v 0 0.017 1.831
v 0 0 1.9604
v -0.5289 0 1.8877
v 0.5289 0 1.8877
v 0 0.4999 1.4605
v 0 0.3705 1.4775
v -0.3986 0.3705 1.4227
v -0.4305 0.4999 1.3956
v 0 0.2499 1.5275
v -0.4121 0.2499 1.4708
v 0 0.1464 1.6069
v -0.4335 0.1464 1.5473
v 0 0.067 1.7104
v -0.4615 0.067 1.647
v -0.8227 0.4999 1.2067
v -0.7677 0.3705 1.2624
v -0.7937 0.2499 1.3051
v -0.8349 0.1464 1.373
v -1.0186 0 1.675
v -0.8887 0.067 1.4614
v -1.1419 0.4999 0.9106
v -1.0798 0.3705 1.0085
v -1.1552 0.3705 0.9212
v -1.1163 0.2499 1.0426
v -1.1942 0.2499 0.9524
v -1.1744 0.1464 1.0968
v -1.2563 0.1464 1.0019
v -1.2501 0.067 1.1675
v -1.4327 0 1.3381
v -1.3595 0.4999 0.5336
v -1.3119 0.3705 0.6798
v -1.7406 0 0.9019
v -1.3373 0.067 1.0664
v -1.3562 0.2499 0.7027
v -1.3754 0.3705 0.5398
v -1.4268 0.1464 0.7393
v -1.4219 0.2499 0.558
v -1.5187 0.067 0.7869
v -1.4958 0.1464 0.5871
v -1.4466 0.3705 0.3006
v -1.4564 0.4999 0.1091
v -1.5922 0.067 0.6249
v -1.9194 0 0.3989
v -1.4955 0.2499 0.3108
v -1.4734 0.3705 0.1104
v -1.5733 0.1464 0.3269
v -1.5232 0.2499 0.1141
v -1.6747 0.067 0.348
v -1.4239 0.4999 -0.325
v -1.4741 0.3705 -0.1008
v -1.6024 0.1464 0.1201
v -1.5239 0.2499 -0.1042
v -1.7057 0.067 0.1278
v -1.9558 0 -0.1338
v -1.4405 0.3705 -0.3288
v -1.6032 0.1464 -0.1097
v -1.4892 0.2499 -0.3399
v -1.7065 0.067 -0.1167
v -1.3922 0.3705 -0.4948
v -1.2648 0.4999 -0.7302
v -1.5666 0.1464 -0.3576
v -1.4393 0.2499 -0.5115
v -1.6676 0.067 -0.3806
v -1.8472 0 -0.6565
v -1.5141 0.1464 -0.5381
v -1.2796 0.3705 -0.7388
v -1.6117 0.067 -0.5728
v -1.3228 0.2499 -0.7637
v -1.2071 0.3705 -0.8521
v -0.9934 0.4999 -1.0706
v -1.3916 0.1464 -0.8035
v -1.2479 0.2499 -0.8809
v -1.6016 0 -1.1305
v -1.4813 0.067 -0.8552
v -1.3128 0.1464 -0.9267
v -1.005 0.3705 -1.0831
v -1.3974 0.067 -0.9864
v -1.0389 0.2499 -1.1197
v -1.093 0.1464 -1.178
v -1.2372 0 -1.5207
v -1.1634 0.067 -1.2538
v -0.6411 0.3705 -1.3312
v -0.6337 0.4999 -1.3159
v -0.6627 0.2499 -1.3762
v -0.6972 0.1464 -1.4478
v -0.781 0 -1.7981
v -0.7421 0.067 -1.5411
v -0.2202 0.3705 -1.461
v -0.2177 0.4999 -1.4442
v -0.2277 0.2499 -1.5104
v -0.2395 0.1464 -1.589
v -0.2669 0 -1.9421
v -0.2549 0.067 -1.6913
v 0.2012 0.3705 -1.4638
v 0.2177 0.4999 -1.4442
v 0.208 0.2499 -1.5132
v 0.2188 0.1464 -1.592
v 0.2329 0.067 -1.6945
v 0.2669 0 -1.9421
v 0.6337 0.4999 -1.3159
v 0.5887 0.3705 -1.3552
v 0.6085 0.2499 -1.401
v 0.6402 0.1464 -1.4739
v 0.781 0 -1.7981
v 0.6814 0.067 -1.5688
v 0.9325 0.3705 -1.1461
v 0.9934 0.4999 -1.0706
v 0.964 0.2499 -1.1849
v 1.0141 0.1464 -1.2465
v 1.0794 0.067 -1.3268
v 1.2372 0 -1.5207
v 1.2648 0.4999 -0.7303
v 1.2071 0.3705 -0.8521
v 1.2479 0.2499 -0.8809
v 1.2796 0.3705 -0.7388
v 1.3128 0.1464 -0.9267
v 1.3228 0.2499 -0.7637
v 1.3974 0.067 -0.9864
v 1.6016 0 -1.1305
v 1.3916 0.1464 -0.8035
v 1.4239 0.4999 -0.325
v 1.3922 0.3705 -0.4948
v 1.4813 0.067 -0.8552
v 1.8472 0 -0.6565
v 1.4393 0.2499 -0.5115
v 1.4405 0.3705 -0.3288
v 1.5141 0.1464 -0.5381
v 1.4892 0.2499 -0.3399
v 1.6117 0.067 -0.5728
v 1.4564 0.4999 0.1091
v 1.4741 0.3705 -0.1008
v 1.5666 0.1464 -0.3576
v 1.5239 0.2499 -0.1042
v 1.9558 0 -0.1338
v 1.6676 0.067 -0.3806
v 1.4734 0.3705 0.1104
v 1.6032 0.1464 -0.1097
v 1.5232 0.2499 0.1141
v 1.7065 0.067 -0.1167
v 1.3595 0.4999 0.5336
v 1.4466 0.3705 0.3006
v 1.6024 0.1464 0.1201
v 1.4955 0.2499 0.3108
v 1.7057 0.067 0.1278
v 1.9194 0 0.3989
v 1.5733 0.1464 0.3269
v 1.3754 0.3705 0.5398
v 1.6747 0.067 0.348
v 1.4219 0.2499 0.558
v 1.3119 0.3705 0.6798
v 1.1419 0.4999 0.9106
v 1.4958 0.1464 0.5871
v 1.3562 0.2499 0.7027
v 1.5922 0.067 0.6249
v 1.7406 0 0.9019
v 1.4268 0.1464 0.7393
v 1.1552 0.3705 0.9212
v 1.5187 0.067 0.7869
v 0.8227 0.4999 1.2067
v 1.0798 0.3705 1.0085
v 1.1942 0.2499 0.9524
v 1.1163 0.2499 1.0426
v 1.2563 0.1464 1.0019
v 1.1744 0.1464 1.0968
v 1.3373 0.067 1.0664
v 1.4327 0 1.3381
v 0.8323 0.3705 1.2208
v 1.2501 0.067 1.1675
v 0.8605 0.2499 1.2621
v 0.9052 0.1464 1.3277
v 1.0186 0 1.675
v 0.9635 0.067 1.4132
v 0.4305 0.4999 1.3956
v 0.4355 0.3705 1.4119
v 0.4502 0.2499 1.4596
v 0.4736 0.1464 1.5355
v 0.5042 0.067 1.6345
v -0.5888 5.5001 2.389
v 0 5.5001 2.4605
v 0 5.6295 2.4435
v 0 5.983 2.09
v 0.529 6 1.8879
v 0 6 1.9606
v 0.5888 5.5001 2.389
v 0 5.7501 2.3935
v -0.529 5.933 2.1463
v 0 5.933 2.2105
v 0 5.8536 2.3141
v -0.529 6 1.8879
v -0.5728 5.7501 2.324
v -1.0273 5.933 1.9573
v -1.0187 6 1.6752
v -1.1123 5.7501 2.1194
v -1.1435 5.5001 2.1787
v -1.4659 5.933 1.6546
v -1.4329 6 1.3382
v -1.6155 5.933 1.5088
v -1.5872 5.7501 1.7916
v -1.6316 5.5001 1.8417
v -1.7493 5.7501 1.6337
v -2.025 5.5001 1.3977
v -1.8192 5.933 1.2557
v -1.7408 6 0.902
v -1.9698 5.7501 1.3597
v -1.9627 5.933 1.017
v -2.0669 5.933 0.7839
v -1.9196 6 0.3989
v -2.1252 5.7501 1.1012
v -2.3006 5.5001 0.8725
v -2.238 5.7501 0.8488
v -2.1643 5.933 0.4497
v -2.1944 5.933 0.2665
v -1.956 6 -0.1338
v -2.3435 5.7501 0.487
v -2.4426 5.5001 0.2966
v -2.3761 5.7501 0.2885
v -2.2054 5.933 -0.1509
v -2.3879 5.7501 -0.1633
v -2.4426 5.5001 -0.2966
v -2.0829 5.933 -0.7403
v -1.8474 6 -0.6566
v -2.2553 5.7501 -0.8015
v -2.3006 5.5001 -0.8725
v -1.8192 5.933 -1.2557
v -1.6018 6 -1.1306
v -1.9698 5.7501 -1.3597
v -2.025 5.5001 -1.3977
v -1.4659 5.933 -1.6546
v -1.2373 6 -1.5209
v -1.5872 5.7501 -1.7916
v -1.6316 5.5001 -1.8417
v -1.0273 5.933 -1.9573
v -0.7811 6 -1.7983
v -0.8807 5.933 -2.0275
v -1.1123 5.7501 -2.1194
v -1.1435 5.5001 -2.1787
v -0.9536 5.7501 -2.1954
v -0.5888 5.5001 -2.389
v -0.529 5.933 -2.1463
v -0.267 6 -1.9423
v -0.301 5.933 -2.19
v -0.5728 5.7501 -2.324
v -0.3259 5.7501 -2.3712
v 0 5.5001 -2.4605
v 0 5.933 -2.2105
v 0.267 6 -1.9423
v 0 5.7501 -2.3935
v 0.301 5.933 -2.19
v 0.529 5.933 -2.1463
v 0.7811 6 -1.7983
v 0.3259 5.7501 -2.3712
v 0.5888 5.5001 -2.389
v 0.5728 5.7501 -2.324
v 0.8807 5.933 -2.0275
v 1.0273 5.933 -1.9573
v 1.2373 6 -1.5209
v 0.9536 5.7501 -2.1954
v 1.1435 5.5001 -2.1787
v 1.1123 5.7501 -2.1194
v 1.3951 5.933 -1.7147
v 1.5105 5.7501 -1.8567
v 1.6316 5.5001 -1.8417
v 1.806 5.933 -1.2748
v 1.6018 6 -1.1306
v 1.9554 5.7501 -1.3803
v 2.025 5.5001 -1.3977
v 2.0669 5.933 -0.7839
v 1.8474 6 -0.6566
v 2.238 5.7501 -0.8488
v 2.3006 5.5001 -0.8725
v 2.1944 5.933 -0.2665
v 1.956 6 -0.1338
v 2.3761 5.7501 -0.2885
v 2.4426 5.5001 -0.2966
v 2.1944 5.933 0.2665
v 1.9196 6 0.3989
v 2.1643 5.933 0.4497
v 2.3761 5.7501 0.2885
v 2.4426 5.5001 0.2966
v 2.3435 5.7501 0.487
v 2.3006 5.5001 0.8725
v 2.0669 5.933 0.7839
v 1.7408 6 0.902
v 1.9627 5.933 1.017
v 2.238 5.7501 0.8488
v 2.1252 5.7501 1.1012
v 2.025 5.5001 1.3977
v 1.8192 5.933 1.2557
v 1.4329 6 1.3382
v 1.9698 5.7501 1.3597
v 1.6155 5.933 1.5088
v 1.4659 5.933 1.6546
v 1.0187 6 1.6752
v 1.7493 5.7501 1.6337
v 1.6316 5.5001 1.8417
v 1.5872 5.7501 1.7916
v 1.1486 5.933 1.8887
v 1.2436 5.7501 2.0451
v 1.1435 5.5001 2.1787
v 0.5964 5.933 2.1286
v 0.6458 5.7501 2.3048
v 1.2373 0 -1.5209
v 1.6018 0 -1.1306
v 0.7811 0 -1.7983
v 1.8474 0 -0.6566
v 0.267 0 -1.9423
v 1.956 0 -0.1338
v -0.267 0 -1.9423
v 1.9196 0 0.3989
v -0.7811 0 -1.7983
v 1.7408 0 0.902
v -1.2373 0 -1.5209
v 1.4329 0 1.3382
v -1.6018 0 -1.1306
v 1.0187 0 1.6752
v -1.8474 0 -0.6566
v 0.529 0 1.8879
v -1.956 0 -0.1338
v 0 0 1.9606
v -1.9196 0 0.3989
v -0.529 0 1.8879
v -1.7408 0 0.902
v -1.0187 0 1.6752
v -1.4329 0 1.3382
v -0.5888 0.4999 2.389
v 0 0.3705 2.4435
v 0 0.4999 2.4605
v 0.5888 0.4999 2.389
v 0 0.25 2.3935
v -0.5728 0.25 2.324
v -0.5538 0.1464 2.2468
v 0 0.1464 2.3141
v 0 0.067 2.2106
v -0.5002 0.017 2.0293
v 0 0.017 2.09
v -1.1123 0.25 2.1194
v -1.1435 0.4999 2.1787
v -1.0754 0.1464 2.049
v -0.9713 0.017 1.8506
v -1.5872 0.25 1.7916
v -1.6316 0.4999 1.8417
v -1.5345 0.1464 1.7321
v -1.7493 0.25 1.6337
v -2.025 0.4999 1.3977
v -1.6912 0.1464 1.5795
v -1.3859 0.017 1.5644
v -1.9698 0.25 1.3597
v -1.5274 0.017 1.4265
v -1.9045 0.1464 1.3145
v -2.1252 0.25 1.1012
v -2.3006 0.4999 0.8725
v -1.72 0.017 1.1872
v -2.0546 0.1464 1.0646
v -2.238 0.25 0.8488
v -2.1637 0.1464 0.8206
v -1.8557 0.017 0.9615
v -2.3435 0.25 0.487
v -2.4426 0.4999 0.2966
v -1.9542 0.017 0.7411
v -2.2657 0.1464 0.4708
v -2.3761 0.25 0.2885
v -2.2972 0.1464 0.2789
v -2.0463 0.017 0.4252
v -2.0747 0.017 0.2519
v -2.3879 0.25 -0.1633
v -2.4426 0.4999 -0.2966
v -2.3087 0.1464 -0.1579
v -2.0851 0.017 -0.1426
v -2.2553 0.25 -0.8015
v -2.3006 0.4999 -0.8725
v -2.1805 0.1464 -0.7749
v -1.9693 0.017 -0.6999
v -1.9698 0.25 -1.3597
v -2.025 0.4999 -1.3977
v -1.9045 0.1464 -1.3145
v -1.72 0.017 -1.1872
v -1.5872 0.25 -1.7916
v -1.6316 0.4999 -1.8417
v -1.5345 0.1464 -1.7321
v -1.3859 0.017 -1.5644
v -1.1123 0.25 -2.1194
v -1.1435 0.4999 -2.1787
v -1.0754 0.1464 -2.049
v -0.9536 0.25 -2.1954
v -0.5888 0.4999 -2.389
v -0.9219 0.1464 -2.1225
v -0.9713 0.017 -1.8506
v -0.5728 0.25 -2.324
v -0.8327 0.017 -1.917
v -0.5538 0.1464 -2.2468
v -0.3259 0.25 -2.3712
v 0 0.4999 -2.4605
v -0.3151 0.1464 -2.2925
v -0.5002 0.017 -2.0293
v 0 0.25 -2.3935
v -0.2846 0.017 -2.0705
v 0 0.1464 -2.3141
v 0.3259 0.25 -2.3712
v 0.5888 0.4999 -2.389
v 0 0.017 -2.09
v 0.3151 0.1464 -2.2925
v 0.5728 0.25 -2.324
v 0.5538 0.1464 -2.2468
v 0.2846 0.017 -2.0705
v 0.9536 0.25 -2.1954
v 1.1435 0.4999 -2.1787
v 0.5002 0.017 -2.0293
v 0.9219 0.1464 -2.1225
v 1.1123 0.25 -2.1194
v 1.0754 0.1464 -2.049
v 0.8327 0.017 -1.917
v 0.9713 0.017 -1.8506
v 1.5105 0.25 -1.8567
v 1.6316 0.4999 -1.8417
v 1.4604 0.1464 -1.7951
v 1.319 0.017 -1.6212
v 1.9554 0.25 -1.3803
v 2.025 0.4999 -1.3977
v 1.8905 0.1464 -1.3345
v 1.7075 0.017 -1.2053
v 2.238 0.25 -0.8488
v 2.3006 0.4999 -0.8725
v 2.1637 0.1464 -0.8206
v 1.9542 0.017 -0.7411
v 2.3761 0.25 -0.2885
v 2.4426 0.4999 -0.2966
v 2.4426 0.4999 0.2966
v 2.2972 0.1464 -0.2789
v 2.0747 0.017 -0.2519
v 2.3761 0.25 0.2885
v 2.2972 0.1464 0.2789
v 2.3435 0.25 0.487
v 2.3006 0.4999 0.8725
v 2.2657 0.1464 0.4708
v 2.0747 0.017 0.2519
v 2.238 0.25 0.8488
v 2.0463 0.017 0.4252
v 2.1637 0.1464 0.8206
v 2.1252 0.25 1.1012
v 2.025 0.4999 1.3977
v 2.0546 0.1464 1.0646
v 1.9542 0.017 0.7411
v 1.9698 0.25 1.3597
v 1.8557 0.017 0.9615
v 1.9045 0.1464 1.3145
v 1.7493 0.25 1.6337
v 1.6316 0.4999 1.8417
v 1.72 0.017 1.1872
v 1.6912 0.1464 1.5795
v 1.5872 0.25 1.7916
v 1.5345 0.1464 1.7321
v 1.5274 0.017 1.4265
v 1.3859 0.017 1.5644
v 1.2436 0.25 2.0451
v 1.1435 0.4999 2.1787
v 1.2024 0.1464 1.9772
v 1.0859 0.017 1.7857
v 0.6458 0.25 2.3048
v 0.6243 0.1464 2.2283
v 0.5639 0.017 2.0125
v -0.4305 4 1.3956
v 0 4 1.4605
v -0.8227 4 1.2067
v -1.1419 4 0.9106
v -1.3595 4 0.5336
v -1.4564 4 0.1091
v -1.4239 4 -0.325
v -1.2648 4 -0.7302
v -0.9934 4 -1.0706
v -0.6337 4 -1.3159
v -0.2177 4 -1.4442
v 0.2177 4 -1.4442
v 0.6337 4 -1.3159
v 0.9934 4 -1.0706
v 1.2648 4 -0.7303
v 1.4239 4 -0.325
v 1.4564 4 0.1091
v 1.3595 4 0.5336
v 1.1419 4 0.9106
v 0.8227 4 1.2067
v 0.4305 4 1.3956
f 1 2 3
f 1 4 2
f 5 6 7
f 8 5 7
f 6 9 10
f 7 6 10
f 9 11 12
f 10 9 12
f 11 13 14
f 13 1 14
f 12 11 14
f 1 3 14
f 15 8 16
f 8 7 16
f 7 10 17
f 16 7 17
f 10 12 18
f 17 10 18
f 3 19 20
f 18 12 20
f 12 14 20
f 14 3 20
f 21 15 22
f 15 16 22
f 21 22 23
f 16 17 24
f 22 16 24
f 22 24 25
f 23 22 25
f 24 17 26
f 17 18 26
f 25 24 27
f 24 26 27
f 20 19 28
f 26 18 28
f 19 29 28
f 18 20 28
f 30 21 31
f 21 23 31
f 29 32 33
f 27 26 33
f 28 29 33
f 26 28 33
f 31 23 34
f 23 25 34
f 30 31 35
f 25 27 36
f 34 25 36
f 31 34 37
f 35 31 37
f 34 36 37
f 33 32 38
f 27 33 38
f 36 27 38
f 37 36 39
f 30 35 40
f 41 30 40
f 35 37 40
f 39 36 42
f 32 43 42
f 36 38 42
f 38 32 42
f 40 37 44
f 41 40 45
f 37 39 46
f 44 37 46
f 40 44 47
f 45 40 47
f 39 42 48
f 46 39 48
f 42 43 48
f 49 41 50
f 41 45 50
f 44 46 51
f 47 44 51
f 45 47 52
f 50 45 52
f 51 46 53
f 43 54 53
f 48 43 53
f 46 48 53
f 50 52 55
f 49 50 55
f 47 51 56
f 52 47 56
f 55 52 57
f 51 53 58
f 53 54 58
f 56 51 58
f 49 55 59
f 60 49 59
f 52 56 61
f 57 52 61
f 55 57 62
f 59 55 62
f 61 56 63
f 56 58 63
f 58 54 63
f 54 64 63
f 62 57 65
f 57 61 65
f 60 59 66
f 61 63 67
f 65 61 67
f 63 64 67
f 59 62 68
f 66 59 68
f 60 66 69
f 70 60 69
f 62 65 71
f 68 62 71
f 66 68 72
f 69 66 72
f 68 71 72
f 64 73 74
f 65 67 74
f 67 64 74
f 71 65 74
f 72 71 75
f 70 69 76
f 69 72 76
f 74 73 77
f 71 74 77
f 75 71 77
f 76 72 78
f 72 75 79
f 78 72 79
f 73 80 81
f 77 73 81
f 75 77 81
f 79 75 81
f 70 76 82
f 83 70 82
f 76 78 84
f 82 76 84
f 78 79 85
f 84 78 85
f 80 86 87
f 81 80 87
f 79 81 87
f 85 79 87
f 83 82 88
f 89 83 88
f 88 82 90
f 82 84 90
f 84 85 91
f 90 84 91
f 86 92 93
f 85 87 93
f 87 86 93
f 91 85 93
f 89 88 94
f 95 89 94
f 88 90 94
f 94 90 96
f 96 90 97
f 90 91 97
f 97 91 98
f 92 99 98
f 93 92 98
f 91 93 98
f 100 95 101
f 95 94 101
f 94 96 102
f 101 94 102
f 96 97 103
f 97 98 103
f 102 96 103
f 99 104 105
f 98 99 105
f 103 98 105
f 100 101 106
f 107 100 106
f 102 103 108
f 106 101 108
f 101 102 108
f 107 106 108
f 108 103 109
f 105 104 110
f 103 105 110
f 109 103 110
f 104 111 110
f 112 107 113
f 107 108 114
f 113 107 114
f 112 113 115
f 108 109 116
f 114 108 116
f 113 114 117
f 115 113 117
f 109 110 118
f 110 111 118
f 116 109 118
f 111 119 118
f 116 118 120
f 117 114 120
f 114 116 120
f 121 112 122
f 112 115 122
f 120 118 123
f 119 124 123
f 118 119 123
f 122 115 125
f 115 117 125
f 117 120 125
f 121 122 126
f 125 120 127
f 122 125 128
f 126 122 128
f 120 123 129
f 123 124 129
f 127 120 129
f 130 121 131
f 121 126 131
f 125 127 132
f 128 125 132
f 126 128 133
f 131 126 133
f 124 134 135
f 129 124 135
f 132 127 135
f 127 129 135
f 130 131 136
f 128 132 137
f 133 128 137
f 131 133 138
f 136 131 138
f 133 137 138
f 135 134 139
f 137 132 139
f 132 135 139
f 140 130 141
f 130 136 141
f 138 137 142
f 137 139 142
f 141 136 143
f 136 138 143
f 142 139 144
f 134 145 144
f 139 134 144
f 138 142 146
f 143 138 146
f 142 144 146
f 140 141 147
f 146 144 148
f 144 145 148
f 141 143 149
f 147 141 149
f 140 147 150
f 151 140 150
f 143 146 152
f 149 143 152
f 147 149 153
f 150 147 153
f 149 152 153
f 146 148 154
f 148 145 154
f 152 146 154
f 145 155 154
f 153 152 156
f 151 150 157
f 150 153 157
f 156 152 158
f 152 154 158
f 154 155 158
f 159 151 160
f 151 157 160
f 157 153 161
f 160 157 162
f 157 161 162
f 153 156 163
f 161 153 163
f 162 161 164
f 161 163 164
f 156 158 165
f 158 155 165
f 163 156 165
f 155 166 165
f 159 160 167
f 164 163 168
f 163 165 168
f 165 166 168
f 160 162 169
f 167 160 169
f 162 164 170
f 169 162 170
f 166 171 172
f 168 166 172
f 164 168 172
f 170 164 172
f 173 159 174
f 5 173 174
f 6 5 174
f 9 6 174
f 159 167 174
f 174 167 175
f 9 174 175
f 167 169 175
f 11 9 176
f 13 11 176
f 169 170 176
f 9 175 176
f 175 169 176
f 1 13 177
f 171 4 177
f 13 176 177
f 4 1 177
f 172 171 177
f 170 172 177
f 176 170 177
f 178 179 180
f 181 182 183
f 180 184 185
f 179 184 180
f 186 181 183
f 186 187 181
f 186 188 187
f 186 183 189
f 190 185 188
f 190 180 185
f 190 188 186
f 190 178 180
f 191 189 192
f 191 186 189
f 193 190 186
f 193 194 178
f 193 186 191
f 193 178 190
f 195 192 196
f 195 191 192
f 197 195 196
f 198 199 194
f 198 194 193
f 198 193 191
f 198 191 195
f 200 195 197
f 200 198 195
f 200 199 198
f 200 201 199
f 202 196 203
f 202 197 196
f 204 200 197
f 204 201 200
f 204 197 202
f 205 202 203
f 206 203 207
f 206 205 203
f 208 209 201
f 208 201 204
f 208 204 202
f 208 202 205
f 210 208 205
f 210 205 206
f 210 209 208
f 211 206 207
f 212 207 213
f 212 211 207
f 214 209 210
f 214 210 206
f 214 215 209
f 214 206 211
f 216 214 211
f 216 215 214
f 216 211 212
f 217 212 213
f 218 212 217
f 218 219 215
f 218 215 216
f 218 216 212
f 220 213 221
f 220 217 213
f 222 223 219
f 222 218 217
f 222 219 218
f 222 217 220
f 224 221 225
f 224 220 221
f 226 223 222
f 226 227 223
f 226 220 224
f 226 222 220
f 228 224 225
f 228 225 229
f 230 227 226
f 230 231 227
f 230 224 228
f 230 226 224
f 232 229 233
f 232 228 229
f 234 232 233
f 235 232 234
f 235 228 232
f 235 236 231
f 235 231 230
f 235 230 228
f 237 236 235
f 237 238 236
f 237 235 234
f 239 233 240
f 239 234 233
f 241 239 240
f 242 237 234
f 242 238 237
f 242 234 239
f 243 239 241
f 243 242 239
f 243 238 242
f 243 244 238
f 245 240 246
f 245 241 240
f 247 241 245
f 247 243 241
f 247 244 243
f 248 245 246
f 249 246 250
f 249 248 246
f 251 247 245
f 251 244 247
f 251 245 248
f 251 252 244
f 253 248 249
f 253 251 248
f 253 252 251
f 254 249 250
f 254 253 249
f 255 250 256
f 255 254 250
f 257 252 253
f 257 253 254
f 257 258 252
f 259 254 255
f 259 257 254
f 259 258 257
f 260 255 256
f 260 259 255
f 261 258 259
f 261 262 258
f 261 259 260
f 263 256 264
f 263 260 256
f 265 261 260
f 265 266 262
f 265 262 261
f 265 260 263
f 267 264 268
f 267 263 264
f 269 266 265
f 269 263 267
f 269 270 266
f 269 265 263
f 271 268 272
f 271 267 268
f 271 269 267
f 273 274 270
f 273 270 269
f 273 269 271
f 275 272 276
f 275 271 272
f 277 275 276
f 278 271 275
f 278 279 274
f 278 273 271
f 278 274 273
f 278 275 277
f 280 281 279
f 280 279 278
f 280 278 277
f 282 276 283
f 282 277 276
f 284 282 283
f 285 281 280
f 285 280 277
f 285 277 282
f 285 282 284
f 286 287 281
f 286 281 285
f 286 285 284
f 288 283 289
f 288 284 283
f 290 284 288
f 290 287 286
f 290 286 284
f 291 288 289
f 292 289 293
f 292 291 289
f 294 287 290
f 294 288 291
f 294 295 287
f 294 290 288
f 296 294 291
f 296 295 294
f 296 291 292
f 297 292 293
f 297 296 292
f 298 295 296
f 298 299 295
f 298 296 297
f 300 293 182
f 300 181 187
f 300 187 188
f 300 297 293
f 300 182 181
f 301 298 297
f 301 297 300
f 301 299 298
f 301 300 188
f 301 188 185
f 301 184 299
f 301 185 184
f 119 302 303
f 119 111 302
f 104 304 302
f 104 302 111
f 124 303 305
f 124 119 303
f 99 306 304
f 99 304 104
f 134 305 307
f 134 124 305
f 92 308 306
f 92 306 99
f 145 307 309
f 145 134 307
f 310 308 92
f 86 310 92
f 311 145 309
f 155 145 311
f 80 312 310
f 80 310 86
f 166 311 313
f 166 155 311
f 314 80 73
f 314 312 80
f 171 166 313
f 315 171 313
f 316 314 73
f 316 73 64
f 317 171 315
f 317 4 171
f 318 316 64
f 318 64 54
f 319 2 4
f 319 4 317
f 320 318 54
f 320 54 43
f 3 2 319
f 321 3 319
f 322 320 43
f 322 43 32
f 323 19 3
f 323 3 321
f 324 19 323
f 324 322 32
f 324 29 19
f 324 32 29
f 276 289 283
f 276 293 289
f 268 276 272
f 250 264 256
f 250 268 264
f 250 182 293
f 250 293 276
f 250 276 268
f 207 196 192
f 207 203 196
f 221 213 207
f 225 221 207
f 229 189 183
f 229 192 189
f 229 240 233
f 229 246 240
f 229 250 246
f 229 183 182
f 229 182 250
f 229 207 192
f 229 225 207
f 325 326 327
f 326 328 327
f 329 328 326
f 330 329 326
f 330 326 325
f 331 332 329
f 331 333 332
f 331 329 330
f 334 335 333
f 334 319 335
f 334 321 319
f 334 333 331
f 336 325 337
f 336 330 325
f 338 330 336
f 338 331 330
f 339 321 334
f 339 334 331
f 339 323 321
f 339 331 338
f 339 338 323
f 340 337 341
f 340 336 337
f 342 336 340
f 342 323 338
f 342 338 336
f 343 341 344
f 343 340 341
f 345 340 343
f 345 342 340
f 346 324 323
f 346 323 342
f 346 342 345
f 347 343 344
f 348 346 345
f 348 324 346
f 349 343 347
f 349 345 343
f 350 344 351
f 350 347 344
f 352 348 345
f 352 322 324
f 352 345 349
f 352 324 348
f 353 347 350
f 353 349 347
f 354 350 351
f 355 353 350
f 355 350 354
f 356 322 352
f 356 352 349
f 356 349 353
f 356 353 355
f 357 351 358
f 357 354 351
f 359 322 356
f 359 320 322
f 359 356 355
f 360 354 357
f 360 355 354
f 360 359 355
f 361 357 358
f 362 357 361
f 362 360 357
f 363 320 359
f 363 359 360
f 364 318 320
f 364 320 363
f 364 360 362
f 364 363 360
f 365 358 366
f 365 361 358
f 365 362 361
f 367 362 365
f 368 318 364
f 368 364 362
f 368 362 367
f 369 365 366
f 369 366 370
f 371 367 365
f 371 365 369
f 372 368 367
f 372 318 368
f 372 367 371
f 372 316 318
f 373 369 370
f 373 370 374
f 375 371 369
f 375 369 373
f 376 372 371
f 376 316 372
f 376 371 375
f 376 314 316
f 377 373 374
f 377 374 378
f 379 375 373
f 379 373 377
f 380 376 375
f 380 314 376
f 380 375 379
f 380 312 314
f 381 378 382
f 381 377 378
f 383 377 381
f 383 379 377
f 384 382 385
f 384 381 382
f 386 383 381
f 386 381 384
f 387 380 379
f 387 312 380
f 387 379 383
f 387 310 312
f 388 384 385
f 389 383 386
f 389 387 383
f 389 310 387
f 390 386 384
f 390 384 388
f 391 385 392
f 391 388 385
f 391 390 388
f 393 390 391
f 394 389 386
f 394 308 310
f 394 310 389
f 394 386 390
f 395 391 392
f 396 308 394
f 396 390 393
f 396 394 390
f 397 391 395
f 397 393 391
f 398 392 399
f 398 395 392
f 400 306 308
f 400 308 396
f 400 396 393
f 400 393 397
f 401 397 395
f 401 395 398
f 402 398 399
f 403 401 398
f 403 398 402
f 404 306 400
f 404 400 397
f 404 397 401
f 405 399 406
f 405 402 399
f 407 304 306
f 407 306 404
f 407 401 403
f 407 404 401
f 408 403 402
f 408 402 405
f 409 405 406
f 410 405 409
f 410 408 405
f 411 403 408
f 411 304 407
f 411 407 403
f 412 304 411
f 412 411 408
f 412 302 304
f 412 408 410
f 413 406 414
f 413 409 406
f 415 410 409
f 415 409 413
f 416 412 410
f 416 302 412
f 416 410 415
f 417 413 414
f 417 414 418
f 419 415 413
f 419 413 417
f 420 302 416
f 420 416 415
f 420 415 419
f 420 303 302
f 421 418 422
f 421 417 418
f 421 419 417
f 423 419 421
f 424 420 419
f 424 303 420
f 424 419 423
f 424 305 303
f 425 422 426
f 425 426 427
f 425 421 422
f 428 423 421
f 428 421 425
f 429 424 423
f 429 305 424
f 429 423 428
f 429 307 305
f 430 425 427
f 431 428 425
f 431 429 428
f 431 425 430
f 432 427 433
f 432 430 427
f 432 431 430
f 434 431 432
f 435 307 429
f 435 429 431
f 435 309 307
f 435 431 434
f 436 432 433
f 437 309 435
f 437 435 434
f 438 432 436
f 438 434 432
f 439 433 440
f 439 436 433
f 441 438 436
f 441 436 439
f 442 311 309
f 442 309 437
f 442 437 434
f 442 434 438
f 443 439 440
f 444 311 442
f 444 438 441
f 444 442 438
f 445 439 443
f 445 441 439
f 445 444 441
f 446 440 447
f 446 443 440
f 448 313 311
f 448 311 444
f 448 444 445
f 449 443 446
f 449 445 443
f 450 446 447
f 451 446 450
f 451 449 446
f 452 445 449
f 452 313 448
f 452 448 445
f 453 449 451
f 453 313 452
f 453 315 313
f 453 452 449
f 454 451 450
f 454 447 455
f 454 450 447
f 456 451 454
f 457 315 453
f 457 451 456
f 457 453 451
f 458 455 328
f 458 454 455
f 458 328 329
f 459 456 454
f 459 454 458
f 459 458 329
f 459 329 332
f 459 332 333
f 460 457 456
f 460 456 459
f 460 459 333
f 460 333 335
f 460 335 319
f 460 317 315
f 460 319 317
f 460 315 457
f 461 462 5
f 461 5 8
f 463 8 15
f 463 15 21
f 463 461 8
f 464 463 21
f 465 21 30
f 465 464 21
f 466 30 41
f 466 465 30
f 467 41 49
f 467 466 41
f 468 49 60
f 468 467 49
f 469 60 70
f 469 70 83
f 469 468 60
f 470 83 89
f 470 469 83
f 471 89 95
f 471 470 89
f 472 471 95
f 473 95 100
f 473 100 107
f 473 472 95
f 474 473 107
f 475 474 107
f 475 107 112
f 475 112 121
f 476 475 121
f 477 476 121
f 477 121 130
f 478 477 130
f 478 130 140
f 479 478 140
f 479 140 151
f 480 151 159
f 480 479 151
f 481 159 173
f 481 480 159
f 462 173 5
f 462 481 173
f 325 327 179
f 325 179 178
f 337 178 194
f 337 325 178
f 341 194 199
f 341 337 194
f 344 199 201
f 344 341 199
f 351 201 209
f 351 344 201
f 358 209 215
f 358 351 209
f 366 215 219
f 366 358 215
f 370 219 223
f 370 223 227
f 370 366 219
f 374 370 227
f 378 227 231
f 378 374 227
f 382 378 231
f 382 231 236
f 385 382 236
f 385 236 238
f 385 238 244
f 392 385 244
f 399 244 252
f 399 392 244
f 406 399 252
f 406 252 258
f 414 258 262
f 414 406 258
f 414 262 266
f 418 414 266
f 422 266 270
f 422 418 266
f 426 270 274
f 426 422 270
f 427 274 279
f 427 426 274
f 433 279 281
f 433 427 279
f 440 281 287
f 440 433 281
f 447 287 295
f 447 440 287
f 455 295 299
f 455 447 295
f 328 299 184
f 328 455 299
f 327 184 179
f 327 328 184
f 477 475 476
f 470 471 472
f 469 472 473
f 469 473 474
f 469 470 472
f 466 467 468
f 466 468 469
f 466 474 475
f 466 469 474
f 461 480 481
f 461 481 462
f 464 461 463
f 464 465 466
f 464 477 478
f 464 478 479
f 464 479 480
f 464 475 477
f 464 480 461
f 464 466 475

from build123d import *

# Parameters (mm, degrees)
FILLET1_R = 0.5


with BuildPart() as part:
    # Sketch1 → Revolve1 (revolve)
    with BuildSketch(Plane.XY, mode=Mode.PRIVATE) as revolve1_sk:
        Polygon((-1.4605, 0), (-1.4605, 4), (0, 4), (0, 6), (-2.4605, 6), (-2.4605, 0), align=None)
    revolve(revolve1_sk.sketch.rotate(Axis((0, 0, 0), (0, -1, 0)), 270), axis=Axis((0, 0, 0), (0, -1, 0)))

    # Fillet1
    fillet1_edges = [part.edges().sort_by_distance(p)[0] for p in [
        (0, 0, -2.4605),
        (0, 6, -2.4605),
        (0, 0, -1.4605),
    ]]
    fillet(fillet1_edges, radius=FILLET1_R - 0.0001)  # a hair under: the kernel refuses the full size


solid = part.part
